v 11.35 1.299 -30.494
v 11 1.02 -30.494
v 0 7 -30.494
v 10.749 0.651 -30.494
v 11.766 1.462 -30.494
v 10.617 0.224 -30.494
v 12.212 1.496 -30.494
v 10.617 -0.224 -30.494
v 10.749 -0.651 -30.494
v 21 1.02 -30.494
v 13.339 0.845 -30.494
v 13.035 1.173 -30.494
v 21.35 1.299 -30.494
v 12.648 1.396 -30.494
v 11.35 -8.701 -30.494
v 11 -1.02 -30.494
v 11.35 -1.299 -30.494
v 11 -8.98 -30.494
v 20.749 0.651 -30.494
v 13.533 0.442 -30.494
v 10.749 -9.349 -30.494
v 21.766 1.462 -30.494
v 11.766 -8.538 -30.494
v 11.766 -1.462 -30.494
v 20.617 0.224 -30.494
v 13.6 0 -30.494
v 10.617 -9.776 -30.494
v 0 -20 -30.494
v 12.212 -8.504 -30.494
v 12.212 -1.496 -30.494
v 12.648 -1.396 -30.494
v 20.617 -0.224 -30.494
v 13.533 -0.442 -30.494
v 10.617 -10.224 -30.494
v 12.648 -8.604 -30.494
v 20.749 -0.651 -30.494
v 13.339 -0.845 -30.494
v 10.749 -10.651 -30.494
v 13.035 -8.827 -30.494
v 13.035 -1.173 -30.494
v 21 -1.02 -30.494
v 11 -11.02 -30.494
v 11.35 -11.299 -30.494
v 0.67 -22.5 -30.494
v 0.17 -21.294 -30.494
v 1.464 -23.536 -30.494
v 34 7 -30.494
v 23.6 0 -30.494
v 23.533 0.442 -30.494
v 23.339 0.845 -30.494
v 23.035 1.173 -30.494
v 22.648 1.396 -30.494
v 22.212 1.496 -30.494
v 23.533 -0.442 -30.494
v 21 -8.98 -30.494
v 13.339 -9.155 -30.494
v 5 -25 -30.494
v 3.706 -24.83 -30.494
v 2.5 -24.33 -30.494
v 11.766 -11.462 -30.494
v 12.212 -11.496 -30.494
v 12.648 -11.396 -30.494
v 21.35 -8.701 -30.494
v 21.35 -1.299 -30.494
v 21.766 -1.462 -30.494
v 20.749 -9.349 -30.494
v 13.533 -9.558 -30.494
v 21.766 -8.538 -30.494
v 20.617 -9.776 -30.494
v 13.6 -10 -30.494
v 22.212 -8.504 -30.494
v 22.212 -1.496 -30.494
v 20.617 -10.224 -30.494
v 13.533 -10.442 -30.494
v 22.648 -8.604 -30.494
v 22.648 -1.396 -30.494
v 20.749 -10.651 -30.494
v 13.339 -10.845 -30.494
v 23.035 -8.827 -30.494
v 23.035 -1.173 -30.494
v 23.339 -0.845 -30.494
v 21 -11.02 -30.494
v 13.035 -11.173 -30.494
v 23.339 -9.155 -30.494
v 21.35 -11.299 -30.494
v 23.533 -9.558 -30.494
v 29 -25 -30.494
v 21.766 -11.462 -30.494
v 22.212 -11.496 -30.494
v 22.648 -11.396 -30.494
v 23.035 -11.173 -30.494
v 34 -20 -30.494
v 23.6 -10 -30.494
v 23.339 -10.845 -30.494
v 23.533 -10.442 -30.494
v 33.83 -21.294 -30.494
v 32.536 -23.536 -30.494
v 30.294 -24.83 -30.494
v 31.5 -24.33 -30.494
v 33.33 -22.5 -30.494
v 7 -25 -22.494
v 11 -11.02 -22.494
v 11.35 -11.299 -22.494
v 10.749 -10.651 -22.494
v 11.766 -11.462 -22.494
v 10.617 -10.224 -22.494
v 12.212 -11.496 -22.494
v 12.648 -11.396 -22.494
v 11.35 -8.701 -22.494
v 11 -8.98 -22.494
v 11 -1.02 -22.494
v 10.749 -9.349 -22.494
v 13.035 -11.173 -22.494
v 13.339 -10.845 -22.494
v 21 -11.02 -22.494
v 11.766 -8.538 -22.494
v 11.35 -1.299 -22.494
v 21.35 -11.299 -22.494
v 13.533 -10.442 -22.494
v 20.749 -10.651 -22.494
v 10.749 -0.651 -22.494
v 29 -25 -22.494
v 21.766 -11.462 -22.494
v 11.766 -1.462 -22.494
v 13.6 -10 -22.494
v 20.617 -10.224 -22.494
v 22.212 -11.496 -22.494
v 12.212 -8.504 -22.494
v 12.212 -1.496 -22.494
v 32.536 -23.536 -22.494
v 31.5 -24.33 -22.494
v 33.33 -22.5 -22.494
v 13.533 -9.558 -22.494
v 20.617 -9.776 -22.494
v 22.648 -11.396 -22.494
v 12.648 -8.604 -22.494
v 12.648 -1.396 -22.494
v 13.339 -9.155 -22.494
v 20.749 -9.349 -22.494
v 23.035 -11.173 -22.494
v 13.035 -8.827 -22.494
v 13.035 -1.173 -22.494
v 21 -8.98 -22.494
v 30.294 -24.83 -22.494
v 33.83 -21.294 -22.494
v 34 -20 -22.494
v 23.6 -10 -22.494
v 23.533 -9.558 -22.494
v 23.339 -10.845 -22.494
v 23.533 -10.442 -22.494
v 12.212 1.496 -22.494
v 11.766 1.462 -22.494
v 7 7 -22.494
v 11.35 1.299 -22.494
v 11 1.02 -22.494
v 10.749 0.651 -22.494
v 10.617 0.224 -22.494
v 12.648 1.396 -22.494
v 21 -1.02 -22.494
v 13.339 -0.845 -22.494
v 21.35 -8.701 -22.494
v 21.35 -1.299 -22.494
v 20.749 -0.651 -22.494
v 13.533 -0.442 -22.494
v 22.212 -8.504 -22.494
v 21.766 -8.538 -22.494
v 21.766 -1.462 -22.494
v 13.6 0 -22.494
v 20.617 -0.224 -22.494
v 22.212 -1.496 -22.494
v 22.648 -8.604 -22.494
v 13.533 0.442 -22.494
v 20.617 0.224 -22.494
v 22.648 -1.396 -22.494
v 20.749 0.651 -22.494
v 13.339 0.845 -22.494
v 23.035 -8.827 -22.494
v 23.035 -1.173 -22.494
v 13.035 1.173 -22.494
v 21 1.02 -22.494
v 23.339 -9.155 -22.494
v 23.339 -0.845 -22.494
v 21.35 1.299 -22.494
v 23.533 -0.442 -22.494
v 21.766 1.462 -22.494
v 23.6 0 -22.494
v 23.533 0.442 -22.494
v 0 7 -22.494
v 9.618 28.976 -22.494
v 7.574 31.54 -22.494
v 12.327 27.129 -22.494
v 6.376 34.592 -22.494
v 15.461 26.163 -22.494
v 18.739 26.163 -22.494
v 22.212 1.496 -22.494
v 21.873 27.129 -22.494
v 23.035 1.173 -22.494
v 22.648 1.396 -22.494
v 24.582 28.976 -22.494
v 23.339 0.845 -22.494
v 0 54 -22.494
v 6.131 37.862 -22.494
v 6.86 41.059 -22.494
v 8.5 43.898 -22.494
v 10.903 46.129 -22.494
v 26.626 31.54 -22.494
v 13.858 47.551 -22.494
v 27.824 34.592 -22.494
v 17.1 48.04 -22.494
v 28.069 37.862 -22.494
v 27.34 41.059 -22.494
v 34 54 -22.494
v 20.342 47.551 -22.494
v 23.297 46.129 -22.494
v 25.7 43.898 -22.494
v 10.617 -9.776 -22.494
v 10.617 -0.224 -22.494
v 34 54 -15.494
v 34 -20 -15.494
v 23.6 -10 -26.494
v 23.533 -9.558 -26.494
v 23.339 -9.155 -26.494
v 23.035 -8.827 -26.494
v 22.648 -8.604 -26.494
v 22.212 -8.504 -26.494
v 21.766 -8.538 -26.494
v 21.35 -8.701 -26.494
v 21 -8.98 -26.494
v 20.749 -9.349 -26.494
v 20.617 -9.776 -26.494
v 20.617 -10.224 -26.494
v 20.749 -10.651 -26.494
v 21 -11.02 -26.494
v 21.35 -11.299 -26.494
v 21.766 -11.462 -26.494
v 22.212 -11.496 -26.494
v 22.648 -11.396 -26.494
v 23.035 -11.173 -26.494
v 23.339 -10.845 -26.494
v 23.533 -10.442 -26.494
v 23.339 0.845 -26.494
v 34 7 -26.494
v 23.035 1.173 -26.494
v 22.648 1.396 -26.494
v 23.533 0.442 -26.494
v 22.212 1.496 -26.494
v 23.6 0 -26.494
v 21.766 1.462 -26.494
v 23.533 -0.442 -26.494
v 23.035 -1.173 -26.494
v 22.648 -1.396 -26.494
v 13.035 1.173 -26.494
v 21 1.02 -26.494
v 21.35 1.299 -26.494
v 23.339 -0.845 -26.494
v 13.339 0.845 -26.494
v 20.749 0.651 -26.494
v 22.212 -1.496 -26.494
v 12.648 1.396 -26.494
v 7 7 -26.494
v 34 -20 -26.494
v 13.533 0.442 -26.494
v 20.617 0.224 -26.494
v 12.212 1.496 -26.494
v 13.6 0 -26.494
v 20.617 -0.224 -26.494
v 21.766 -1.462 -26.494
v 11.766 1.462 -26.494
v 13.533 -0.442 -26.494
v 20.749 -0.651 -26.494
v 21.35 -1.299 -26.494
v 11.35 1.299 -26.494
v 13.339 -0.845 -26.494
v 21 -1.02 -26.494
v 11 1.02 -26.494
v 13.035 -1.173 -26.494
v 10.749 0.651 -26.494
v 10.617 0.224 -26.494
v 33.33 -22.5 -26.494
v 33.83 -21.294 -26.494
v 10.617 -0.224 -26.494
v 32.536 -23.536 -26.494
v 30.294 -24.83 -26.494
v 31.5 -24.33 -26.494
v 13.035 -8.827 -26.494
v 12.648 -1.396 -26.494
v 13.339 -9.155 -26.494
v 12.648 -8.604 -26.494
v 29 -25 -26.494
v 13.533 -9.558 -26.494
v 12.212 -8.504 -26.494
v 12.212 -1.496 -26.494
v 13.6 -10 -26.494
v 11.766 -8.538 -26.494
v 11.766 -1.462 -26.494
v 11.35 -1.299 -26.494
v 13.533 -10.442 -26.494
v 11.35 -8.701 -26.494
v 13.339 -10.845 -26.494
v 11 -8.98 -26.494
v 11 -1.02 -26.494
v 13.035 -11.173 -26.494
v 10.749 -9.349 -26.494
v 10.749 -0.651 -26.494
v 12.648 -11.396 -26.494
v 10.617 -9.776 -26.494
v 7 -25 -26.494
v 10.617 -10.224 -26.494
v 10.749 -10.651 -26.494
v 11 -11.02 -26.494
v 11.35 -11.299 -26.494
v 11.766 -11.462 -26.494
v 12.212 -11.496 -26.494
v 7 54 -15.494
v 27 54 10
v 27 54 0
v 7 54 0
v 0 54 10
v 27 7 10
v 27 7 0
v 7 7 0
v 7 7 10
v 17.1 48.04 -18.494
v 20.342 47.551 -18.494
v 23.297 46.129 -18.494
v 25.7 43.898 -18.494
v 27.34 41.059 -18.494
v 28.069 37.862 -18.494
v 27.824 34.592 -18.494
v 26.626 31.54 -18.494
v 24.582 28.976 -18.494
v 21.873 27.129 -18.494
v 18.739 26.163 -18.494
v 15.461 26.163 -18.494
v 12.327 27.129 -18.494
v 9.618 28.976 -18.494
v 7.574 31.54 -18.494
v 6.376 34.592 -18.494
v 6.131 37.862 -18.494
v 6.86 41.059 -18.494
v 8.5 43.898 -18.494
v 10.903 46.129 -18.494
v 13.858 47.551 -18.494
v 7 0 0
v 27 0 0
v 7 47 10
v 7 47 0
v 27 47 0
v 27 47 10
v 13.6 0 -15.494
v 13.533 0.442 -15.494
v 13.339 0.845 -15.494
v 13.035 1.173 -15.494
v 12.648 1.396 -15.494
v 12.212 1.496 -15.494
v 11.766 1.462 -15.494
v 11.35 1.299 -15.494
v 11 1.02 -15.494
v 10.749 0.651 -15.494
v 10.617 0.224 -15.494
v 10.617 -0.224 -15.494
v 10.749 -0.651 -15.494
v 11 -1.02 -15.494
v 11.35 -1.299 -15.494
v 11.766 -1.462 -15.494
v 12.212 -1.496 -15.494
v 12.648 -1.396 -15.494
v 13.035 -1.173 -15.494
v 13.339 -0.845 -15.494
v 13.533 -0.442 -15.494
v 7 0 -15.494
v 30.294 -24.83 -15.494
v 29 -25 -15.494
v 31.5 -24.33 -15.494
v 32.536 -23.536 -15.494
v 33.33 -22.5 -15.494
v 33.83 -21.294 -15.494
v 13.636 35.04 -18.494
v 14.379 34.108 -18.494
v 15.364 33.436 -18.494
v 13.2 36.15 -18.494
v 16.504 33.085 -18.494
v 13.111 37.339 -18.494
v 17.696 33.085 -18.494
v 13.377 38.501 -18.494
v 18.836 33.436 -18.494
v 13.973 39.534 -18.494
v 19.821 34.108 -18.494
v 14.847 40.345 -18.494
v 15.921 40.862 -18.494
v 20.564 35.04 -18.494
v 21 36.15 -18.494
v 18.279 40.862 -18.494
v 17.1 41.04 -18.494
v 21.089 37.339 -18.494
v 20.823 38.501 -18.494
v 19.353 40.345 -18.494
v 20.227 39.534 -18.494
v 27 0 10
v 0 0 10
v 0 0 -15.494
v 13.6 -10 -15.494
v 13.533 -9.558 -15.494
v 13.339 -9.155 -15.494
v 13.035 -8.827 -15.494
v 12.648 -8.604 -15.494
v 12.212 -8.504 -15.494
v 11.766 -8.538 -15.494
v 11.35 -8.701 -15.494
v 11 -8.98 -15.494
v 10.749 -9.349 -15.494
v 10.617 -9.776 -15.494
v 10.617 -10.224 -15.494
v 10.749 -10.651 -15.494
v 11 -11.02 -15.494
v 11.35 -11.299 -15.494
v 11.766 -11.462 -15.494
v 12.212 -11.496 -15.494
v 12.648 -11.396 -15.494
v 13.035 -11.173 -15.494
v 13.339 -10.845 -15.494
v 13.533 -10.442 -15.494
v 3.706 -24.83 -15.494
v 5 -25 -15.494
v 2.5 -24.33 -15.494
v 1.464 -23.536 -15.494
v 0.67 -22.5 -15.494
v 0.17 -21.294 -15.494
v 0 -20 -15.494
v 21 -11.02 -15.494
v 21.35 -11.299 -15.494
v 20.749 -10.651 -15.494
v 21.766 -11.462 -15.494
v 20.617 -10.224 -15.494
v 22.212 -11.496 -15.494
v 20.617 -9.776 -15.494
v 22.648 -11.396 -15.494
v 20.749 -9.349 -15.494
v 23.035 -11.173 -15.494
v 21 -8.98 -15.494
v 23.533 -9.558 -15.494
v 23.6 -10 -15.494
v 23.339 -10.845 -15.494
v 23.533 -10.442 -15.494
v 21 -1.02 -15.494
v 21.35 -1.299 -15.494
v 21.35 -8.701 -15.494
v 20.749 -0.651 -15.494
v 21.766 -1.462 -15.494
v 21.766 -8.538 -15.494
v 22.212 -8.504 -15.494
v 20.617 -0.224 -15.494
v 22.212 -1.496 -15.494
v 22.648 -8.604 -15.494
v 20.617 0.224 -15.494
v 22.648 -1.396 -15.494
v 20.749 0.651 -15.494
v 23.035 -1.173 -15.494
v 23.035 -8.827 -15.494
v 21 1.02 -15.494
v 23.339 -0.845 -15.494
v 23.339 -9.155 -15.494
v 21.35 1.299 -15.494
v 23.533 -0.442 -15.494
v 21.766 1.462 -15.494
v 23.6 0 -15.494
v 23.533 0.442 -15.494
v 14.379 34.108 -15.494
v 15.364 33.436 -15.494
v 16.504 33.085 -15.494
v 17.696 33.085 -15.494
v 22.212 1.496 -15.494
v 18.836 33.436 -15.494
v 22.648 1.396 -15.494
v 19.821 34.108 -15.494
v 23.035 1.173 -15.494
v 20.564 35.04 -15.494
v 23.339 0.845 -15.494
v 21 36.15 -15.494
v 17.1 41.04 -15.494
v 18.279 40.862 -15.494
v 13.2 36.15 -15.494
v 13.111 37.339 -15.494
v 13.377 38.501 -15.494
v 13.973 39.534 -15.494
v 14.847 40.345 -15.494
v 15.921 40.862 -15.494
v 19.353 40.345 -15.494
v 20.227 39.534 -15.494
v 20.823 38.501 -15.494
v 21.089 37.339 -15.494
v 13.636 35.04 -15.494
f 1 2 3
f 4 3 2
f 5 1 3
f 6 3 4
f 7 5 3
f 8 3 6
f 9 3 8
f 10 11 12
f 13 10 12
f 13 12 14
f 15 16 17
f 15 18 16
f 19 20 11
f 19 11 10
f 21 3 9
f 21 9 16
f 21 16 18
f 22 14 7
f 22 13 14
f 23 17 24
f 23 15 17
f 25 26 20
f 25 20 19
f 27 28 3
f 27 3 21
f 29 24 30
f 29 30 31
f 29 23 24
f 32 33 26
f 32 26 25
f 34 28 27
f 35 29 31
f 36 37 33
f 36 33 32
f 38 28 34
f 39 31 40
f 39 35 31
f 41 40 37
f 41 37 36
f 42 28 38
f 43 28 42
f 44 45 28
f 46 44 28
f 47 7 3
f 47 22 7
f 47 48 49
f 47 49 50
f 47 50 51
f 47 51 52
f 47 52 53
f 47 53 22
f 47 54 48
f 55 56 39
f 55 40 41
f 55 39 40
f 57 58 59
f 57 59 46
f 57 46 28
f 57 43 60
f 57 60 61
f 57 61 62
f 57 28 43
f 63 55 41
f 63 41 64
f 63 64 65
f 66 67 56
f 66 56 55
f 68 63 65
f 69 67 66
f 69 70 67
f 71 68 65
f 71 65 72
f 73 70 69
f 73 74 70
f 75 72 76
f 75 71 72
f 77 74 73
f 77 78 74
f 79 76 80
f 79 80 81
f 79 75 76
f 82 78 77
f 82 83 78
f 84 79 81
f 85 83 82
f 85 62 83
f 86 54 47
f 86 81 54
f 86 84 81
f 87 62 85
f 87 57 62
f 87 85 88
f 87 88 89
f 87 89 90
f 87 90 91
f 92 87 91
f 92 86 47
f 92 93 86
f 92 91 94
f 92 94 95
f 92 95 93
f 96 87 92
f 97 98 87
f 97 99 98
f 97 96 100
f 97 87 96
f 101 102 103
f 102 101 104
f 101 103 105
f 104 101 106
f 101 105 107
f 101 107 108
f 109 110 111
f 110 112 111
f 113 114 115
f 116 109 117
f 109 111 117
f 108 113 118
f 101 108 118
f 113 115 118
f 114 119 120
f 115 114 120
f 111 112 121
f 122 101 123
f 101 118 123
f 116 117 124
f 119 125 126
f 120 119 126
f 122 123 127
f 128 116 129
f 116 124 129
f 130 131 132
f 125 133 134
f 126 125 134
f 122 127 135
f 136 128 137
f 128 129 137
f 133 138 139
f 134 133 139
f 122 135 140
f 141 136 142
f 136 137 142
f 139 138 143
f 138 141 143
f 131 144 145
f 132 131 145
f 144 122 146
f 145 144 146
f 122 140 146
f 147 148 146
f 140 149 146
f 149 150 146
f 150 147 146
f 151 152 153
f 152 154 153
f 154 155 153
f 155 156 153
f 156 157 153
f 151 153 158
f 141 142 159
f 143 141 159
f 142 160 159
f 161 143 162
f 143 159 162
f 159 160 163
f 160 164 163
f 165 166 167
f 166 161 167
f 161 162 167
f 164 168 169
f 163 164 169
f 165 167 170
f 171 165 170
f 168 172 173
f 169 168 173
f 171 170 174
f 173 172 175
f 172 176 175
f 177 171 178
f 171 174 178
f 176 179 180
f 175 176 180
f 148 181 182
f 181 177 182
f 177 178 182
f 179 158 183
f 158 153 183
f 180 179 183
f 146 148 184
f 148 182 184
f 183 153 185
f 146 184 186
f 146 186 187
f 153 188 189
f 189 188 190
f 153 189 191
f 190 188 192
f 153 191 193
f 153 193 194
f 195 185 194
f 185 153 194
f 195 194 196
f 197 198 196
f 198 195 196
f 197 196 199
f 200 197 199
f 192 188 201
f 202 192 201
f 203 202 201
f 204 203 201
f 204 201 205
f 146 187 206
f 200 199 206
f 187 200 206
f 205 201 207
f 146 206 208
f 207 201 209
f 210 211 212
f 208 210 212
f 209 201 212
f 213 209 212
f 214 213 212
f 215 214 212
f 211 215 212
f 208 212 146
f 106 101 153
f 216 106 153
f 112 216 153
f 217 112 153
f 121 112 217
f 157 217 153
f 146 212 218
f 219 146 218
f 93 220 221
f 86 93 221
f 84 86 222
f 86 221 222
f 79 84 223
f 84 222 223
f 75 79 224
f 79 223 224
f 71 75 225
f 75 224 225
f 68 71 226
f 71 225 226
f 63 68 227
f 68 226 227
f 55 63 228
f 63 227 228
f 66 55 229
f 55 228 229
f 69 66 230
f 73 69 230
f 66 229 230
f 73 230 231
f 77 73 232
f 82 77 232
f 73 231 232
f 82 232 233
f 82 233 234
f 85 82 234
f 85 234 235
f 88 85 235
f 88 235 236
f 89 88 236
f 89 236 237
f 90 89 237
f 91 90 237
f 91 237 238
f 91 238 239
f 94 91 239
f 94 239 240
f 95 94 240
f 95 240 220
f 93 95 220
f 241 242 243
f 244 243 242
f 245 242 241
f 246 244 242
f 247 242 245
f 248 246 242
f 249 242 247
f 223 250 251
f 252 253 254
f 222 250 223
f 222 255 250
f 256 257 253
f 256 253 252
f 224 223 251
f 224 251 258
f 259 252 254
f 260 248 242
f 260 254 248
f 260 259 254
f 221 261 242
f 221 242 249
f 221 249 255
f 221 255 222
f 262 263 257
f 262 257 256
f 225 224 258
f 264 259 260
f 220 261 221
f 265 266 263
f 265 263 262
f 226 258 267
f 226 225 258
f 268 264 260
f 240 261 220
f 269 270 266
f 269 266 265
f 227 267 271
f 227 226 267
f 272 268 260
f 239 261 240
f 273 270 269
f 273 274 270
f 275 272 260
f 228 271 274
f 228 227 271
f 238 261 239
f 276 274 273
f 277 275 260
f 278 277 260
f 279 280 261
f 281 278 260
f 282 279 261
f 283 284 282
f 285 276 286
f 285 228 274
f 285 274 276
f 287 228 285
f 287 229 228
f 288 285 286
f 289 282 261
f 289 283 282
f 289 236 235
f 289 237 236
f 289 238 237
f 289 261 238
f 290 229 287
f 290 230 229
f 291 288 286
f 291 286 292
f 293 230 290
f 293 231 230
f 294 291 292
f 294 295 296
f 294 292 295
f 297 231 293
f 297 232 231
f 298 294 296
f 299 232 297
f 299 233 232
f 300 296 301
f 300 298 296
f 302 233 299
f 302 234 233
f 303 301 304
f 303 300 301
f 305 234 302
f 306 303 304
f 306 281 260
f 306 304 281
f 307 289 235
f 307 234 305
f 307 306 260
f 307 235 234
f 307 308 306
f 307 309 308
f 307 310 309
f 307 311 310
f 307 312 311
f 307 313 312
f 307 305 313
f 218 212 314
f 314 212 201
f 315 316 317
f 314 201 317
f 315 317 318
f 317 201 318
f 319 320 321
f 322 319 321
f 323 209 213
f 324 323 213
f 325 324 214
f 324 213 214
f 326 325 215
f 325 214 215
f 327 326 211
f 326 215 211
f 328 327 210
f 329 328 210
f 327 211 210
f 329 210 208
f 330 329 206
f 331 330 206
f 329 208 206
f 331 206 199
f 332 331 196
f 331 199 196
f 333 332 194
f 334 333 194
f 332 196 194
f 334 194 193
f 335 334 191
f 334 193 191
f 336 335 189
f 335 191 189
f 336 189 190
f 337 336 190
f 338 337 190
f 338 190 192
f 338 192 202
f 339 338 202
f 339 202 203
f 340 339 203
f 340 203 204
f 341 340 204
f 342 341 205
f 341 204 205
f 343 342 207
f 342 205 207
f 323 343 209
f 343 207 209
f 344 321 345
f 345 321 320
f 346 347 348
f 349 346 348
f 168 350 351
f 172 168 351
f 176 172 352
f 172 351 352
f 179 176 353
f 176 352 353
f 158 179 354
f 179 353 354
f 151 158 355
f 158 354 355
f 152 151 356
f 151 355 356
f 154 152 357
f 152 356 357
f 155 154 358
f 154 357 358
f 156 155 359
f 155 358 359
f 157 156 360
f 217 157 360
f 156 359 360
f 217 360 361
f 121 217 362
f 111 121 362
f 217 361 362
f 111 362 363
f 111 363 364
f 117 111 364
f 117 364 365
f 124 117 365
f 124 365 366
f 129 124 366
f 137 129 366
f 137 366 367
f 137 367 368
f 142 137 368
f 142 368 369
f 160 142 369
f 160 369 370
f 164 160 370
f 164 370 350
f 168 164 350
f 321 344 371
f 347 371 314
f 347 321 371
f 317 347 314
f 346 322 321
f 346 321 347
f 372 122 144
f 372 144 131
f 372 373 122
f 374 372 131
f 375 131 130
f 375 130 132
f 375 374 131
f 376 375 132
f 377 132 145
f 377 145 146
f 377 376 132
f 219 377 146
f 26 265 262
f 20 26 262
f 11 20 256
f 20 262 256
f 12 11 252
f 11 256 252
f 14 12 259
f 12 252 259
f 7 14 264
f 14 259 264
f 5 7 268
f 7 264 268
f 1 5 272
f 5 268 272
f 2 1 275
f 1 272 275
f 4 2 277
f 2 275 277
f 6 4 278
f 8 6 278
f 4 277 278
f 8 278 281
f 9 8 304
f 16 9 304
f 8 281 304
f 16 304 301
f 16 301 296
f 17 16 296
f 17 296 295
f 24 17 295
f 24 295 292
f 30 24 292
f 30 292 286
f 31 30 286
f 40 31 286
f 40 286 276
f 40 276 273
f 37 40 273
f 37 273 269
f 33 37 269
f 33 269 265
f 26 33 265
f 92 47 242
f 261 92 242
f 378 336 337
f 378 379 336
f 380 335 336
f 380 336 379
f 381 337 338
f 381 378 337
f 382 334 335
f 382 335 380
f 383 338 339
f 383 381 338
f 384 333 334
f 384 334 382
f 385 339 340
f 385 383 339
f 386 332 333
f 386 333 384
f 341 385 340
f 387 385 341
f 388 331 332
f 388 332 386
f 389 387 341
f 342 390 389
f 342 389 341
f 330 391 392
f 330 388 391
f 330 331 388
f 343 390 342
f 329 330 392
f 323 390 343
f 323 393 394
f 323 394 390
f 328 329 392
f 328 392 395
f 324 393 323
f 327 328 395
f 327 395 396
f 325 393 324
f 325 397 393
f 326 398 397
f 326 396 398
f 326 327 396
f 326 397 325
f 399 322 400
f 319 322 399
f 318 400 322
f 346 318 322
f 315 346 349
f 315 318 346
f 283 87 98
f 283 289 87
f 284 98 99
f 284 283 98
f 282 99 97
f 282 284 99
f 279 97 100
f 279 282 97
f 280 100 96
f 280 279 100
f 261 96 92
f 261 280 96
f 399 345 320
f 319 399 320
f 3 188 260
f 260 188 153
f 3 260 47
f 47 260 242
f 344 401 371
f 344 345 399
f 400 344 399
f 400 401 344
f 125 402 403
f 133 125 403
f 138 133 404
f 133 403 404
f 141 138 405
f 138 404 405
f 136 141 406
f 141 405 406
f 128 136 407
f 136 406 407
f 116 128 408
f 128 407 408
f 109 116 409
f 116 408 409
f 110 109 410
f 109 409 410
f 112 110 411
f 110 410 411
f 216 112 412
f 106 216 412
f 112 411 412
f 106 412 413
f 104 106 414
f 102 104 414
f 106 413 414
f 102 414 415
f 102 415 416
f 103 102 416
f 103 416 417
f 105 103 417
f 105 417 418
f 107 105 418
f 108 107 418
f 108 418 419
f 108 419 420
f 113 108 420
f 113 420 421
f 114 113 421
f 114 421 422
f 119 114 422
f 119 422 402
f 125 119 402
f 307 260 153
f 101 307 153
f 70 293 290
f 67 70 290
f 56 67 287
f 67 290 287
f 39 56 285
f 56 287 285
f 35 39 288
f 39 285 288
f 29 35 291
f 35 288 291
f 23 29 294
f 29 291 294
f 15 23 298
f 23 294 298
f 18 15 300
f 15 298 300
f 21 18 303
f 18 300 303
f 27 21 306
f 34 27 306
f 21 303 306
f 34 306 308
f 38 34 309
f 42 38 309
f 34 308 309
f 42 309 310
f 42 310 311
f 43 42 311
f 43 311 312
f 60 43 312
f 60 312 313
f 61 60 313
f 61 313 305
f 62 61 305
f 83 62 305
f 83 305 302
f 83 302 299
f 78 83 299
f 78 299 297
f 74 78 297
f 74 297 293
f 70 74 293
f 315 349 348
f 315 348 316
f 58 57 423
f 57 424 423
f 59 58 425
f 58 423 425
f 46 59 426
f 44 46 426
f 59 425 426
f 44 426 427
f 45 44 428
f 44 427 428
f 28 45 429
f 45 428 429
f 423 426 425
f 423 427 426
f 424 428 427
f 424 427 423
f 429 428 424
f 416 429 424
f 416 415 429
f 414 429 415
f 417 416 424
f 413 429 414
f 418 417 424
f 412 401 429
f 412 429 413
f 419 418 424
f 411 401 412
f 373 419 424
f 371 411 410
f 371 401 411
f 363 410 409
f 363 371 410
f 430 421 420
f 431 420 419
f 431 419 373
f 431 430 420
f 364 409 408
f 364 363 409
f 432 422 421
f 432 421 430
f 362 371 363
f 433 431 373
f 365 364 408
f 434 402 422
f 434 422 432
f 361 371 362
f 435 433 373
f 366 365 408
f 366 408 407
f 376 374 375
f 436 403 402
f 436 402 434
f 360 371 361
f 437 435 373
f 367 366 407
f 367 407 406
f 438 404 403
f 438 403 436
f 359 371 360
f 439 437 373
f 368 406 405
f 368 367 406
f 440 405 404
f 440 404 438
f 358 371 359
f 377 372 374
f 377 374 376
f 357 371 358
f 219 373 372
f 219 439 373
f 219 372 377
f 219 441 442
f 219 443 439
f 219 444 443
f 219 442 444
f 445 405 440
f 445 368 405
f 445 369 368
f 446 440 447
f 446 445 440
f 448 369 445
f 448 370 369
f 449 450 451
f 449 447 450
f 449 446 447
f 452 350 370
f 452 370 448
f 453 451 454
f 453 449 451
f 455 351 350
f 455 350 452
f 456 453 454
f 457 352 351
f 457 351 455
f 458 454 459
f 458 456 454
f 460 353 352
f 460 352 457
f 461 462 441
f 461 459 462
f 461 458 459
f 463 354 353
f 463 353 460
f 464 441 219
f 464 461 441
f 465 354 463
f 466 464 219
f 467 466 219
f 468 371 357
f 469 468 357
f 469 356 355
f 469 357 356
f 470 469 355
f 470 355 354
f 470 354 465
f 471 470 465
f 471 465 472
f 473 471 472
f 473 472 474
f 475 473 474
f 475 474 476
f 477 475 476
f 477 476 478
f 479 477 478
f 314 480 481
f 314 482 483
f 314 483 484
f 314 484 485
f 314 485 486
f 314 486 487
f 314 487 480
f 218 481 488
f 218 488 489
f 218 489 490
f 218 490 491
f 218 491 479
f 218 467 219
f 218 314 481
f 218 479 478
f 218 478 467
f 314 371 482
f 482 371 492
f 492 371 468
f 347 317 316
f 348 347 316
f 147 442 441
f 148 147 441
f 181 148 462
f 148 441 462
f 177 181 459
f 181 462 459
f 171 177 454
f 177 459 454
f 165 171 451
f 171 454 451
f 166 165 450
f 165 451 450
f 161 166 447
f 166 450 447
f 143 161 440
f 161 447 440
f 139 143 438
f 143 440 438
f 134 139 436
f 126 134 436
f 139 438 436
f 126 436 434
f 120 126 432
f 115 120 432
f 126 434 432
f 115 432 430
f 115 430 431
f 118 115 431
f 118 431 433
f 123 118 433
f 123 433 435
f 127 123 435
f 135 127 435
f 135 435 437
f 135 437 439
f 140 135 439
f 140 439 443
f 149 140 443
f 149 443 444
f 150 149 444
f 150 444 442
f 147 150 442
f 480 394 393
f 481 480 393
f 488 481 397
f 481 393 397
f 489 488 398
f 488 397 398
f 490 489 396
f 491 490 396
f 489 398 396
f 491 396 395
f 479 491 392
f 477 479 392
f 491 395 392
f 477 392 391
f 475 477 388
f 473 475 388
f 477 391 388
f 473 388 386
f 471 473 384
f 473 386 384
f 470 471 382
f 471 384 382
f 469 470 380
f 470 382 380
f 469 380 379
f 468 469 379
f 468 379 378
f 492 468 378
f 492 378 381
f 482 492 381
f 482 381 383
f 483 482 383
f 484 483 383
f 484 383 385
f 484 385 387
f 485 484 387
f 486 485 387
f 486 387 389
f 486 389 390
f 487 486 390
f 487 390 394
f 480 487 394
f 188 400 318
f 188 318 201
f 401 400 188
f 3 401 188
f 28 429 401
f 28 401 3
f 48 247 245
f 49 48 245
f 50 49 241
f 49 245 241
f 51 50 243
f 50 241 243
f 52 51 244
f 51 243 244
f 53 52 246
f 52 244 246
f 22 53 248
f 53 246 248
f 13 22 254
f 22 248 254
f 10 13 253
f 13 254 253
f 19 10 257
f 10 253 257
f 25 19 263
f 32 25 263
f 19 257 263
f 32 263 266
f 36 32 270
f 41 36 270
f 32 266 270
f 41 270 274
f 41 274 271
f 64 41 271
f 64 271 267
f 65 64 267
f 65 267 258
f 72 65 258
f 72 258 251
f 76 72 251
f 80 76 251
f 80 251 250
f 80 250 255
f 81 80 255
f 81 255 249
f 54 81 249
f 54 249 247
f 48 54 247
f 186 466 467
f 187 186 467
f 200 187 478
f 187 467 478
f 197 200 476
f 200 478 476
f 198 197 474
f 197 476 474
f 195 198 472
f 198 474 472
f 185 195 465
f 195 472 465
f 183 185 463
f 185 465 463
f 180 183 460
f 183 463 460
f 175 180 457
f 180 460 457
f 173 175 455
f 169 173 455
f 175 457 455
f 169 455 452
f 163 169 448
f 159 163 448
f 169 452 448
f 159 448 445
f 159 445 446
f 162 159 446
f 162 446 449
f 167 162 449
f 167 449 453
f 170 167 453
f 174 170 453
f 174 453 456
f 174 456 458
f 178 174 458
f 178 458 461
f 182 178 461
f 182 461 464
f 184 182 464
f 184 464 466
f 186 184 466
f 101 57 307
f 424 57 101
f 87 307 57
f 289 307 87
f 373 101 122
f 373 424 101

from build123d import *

# Parameters (mm, degrees)
BOSS_EXTRUDE1_DEPTH       = 10
SKETCH2_W                 = 7
SKETCH2_H                 = 54
BOSS_EXTRUDE2_DEPTH       = 15.494
SKETCH3_W                 = 7
SKETCH3_H                 = 54
BOSS_EXTRUDE3_DEPTH       = 34
SKETCH5_R                 = 11
CUT_EXTRUDE2_DEPTH        = 4
SKETCH6_R                 = 4
CUT_EXTRUDE3_DEPTH        = 10
SKETCH7_W                 = 34
SKETCH7_H                 = 7
BOSS_EXTRUDE4_DEPTH       = 25
BOSS_EXTRUDE5_DEPTH       = 32
F_3_0MM_DOWEL_HOLE1_D     = 3
F_3_0MM_DOWEL_HOLE1_DEPTH = 27
F_3_0MM_DOWEL_HOLE1_TIP   = 0.901290929
FILLET2_R                 = 5
FILLET3_R                 = 5


with BuildPart() as part:
    # Sketch1 → Boss-Extrude1 (new body)
    with BuildSketch(Plane.XY):
        Polygon((0, 0), (27, 0), (27, 7), (7, 7), (7, 47), (27, 47), (27, 54), (0, 54), align=None)
    extrude(amount=BOSS_EXTRUDE1_DEPTH)

    # Sketch2 → Boss-Extrude2 (add)
    with BuildSketch(Plane(origin=(0, 0, 0), x_dir=(-1, 0, 0), z_dir=(0, 0, -1))):
        with Locations((-3.5, 27)):
            Rectangle(SKETCH2_W, SKETCH2_H)
    extrude(amount=BOSS_EXTRUDE2_DEPTH)

    # Sketch3 → Boss-Extrude3 (add)
    with BuildSketch(Plane.ZY):
        with Locations((-18.994, 27)):
            Rectangle(SKETCH3_W, SKETCH3_H)
    extrude(amount=-BOSS_EXTRUDE3_DEPTH)

    # Sketch5 → Cut-Extrude2 (cut)
    with BuildSketch(Plane(origin=(0, 0, -22.494), x_dir=(-1, 0, 0), z_dir=(0, 0, -1))):
        with Locations(Location((-17.1, 37.04, 0), (0, 0, 90))):
            Circle(SKETCH5_R)
    extrude(amount=-CUT_EXTRUDE2_DEPTH, mode=Mode.SUBTRACT)

    # Sketch6 → Cut-Extrude3 (cut)
    with BuildSketch(Plane(origin=(0, 0, -18.494), x_dir=(-1, 0, 0), z_dir=(0, 0, -1))):
        with Locations(Location((-17.1, 37.04, 0), (0, 0, 90))):
            Circle(SKETCH6_R)
    extrude(amount=-CUT_EXTRUDE3_DEPTH, mode=Mode.SUBTRACT)

    # Sketch7 → Boss-Extrude4 (add)
    with BuildSketch(Plane.XZ):
        with Locations((17, -18.994)):
            Rectangle(SKETCH7_W, SKETCH7_H)
    extrude(amount=BOSS_EXTRUDE4_DEPTH)

    # Sketch8 → Boss-Extrude5 (add)
    with BuildSketch(Plane.XZ.offset(25)):
        Polygon((0, -22.494), (0, -30.494), (34, -30.494), (34, -26.494), (7, -26.494), (7, -22.494), align=None)
    extrude(amount=-BOSS_EXTRUDE5_DEPTH)

    # Ø3.0mm Dowel Hole1
    with Locations(Plane(origin=(0, 0, -30.494), x_dir=(-1, 0, 0), z_dir=(0, 0, -1))):
        with Locations((-22.1, -10), (-22.1, 0), (-12.1, 0), (-12.1, -10)):
            Hole(F_3_0MM_DOWEL_HOLE1_D / 2, depth=F_3_0MM_DOWEL_HOLE1_DEPTH)
            with Locations((0, 0, -(F_3_0MM_DOWEL_HOLE1_DEPTH + F_3_0MM_DOWEL_HOLE1_TIP / 2))):  # 118° drill point
                Cone(0, F_3_0MM_DOWEL_HOLE1_D / 2, F_3_0MM_DOWEL_HOLE1_TIP, mode=Mode.SUBTRACT)

    # Fillet2
    fillet2_edges = [part.edges().sort_by_distance(p)[0] for p in [
        (34, -25, -18.994),
        (34, -25, -28.494),
    ]]
    fillet(fillet2_edges, radius=FILLET2_R)

    # Fillet3
    fillet3_edges = [part.edges().sort_by_distance(p)[0] for p in [
        (0, -25, -22.994),
    ]]
    fillet(fillet3_edges, radius=FILLET3_R)


solid = part.part
